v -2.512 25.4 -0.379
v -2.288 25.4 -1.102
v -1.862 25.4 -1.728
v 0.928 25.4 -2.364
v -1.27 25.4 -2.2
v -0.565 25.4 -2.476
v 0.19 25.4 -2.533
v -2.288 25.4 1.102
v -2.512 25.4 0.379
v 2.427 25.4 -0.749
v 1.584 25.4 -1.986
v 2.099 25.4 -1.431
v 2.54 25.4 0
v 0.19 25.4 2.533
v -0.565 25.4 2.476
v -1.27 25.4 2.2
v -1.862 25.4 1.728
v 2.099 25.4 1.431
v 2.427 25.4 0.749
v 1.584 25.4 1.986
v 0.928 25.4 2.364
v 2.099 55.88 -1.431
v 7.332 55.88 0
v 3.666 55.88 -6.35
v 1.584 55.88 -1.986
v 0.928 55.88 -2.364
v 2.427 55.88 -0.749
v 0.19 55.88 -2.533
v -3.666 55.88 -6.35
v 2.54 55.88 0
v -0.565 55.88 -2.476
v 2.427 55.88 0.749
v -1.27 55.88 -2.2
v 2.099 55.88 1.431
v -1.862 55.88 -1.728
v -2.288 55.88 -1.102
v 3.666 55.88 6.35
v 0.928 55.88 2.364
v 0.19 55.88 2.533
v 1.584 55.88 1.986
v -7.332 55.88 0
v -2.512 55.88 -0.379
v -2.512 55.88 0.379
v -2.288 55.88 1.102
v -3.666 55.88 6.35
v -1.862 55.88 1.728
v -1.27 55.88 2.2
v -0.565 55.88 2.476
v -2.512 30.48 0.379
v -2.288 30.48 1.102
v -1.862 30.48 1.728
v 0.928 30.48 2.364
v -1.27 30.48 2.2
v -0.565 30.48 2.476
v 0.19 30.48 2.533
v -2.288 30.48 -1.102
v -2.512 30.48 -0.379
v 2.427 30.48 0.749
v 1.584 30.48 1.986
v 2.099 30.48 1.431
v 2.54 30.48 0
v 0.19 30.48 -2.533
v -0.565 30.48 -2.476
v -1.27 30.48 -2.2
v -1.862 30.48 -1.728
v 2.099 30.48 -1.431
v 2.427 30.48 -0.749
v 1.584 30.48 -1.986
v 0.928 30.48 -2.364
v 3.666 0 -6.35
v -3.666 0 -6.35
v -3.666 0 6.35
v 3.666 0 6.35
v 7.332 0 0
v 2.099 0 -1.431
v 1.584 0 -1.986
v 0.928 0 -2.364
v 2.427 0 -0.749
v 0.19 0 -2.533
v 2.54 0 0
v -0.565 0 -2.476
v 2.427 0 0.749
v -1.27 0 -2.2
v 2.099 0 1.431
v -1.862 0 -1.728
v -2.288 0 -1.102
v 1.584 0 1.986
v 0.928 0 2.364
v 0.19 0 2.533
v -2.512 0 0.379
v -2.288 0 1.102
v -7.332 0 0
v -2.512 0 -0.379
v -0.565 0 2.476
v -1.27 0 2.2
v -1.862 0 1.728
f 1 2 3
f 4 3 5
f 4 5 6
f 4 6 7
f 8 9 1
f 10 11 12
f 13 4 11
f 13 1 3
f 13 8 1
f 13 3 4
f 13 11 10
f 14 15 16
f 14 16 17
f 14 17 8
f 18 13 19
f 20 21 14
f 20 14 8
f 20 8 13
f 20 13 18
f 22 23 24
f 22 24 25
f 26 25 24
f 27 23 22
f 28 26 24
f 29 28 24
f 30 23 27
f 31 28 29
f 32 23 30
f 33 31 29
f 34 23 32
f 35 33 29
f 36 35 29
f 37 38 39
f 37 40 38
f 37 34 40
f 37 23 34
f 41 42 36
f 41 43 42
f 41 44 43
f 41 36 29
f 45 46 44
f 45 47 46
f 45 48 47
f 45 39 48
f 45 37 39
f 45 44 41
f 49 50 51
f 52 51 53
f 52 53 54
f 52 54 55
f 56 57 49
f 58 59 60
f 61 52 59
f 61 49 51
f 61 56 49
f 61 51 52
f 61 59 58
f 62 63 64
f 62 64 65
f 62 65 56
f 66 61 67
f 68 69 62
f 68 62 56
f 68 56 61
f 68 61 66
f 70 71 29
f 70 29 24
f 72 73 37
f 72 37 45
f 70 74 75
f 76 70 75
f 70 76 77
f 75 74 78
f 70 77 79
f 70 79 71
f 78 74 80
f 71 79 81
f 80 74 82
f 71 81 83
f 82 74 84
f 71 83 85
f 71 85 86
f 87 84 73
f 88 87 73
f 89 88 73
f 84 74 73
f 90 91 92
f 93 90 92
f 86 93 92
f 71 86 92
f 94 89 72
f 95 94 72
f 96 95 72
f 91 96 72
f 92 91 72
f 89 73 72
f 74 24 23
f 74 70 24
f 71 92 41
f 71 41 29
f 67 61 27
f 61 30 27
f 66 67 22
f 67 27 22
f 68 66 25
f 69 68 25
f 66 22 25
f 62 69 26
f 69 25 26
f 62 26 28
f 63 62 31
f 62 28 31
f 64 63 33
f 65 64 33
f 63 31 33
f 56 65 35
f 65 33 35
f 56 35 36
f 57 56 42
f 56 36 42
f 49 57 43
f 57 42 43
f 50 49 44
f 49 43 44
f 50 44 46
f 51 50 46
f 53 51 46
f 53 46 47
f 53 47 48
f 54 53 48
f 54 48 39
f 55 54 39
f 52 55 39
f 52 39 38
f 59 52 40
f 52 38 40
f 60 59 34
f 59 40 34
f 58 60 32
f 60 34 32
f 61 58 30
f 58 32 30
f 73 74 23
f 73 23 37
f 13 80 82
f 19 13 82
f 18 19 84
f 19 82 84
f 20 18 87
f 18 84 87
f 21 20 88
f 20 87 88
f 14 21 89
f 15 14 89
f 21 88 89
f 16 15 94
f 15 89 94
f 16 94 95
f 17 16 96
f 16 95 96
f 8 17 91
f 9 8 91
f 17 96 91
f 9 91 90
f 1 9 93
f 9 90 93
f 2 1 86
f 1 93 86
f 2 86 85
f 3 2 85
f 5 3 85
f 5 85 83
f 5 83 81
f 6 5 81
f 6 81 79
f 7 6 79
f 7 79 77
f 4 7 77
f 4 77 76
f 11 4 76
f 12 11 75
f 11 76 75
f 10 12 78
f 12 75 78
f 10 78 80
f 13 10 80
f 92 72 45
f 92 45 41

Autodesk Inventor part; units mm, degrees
ref_plane "YZ Plane" through (0, 0, 0) normal (1, 0, 0) x (0, 1, 0)
ref_plane "XZ Plane" through (0, 0, 0) normal (0, 1, 0) x (-1, 0, 0)
ref_plane "XY Plane" through (0, 0, 0) normal (0, 0, 1) x (1, 0, 0)
sketch "Sketch1" plane through (0, 0, 0) normal (0, 1, 0) x (-1, 0, 0)
  line L0 (-3.6662, 6.35) -> (3.6662, 6.35)
  line L1 (3.6662, 6.35) -> (7.3323, 0)
  line L2 (7.3323, 0) -> (3.6662, -6.35)
  line L3 (3.6662, -6.35) -> (-3.6662, -6.35)
  line L4 (-3.6662, -6.35) -> (-7.3323, 0)
  line L5 (-7.3323, 0) -> (-3.6662, 6.35)
  point P0 (0, 0)
  point P1 (0, 0)
  dimension "d0" = 12.7
extrude "Extrusion1" add sketch "Sketch1" along normal blind 55.88
sketch "Sketch2" plane through (0, 55.88, 0) normal (0, 1, 0) x (1, 0, 0)
  circle A0 centre (0, 0) radius 2.54
  dimension "d3" = 5.08
extrude "Extrusion2" cut sketch "Sketch2" against normal blind 25.4
thread "Thread1" size "1/4-20 UNC" class "2B" standard "ANSI Unified Screw Threads" full length
sketch "Sketch3" plane through (0, 0, 0) normal (0, -1, 0) x (1, 0, 0)
  circle A0 centre (0, 0) radius 2.54
  dimension "d8" = 5.08
extrude "Extrusion3" cut sketch "Sketch3" against normal blind 25.4
thread "Thread2" size "1/4-20 UNC" class "2B" standard "ANSI Unified Screw Threads" full length
properties part number "OUTK_016_Shaft3" material "Aluminum 6061"
